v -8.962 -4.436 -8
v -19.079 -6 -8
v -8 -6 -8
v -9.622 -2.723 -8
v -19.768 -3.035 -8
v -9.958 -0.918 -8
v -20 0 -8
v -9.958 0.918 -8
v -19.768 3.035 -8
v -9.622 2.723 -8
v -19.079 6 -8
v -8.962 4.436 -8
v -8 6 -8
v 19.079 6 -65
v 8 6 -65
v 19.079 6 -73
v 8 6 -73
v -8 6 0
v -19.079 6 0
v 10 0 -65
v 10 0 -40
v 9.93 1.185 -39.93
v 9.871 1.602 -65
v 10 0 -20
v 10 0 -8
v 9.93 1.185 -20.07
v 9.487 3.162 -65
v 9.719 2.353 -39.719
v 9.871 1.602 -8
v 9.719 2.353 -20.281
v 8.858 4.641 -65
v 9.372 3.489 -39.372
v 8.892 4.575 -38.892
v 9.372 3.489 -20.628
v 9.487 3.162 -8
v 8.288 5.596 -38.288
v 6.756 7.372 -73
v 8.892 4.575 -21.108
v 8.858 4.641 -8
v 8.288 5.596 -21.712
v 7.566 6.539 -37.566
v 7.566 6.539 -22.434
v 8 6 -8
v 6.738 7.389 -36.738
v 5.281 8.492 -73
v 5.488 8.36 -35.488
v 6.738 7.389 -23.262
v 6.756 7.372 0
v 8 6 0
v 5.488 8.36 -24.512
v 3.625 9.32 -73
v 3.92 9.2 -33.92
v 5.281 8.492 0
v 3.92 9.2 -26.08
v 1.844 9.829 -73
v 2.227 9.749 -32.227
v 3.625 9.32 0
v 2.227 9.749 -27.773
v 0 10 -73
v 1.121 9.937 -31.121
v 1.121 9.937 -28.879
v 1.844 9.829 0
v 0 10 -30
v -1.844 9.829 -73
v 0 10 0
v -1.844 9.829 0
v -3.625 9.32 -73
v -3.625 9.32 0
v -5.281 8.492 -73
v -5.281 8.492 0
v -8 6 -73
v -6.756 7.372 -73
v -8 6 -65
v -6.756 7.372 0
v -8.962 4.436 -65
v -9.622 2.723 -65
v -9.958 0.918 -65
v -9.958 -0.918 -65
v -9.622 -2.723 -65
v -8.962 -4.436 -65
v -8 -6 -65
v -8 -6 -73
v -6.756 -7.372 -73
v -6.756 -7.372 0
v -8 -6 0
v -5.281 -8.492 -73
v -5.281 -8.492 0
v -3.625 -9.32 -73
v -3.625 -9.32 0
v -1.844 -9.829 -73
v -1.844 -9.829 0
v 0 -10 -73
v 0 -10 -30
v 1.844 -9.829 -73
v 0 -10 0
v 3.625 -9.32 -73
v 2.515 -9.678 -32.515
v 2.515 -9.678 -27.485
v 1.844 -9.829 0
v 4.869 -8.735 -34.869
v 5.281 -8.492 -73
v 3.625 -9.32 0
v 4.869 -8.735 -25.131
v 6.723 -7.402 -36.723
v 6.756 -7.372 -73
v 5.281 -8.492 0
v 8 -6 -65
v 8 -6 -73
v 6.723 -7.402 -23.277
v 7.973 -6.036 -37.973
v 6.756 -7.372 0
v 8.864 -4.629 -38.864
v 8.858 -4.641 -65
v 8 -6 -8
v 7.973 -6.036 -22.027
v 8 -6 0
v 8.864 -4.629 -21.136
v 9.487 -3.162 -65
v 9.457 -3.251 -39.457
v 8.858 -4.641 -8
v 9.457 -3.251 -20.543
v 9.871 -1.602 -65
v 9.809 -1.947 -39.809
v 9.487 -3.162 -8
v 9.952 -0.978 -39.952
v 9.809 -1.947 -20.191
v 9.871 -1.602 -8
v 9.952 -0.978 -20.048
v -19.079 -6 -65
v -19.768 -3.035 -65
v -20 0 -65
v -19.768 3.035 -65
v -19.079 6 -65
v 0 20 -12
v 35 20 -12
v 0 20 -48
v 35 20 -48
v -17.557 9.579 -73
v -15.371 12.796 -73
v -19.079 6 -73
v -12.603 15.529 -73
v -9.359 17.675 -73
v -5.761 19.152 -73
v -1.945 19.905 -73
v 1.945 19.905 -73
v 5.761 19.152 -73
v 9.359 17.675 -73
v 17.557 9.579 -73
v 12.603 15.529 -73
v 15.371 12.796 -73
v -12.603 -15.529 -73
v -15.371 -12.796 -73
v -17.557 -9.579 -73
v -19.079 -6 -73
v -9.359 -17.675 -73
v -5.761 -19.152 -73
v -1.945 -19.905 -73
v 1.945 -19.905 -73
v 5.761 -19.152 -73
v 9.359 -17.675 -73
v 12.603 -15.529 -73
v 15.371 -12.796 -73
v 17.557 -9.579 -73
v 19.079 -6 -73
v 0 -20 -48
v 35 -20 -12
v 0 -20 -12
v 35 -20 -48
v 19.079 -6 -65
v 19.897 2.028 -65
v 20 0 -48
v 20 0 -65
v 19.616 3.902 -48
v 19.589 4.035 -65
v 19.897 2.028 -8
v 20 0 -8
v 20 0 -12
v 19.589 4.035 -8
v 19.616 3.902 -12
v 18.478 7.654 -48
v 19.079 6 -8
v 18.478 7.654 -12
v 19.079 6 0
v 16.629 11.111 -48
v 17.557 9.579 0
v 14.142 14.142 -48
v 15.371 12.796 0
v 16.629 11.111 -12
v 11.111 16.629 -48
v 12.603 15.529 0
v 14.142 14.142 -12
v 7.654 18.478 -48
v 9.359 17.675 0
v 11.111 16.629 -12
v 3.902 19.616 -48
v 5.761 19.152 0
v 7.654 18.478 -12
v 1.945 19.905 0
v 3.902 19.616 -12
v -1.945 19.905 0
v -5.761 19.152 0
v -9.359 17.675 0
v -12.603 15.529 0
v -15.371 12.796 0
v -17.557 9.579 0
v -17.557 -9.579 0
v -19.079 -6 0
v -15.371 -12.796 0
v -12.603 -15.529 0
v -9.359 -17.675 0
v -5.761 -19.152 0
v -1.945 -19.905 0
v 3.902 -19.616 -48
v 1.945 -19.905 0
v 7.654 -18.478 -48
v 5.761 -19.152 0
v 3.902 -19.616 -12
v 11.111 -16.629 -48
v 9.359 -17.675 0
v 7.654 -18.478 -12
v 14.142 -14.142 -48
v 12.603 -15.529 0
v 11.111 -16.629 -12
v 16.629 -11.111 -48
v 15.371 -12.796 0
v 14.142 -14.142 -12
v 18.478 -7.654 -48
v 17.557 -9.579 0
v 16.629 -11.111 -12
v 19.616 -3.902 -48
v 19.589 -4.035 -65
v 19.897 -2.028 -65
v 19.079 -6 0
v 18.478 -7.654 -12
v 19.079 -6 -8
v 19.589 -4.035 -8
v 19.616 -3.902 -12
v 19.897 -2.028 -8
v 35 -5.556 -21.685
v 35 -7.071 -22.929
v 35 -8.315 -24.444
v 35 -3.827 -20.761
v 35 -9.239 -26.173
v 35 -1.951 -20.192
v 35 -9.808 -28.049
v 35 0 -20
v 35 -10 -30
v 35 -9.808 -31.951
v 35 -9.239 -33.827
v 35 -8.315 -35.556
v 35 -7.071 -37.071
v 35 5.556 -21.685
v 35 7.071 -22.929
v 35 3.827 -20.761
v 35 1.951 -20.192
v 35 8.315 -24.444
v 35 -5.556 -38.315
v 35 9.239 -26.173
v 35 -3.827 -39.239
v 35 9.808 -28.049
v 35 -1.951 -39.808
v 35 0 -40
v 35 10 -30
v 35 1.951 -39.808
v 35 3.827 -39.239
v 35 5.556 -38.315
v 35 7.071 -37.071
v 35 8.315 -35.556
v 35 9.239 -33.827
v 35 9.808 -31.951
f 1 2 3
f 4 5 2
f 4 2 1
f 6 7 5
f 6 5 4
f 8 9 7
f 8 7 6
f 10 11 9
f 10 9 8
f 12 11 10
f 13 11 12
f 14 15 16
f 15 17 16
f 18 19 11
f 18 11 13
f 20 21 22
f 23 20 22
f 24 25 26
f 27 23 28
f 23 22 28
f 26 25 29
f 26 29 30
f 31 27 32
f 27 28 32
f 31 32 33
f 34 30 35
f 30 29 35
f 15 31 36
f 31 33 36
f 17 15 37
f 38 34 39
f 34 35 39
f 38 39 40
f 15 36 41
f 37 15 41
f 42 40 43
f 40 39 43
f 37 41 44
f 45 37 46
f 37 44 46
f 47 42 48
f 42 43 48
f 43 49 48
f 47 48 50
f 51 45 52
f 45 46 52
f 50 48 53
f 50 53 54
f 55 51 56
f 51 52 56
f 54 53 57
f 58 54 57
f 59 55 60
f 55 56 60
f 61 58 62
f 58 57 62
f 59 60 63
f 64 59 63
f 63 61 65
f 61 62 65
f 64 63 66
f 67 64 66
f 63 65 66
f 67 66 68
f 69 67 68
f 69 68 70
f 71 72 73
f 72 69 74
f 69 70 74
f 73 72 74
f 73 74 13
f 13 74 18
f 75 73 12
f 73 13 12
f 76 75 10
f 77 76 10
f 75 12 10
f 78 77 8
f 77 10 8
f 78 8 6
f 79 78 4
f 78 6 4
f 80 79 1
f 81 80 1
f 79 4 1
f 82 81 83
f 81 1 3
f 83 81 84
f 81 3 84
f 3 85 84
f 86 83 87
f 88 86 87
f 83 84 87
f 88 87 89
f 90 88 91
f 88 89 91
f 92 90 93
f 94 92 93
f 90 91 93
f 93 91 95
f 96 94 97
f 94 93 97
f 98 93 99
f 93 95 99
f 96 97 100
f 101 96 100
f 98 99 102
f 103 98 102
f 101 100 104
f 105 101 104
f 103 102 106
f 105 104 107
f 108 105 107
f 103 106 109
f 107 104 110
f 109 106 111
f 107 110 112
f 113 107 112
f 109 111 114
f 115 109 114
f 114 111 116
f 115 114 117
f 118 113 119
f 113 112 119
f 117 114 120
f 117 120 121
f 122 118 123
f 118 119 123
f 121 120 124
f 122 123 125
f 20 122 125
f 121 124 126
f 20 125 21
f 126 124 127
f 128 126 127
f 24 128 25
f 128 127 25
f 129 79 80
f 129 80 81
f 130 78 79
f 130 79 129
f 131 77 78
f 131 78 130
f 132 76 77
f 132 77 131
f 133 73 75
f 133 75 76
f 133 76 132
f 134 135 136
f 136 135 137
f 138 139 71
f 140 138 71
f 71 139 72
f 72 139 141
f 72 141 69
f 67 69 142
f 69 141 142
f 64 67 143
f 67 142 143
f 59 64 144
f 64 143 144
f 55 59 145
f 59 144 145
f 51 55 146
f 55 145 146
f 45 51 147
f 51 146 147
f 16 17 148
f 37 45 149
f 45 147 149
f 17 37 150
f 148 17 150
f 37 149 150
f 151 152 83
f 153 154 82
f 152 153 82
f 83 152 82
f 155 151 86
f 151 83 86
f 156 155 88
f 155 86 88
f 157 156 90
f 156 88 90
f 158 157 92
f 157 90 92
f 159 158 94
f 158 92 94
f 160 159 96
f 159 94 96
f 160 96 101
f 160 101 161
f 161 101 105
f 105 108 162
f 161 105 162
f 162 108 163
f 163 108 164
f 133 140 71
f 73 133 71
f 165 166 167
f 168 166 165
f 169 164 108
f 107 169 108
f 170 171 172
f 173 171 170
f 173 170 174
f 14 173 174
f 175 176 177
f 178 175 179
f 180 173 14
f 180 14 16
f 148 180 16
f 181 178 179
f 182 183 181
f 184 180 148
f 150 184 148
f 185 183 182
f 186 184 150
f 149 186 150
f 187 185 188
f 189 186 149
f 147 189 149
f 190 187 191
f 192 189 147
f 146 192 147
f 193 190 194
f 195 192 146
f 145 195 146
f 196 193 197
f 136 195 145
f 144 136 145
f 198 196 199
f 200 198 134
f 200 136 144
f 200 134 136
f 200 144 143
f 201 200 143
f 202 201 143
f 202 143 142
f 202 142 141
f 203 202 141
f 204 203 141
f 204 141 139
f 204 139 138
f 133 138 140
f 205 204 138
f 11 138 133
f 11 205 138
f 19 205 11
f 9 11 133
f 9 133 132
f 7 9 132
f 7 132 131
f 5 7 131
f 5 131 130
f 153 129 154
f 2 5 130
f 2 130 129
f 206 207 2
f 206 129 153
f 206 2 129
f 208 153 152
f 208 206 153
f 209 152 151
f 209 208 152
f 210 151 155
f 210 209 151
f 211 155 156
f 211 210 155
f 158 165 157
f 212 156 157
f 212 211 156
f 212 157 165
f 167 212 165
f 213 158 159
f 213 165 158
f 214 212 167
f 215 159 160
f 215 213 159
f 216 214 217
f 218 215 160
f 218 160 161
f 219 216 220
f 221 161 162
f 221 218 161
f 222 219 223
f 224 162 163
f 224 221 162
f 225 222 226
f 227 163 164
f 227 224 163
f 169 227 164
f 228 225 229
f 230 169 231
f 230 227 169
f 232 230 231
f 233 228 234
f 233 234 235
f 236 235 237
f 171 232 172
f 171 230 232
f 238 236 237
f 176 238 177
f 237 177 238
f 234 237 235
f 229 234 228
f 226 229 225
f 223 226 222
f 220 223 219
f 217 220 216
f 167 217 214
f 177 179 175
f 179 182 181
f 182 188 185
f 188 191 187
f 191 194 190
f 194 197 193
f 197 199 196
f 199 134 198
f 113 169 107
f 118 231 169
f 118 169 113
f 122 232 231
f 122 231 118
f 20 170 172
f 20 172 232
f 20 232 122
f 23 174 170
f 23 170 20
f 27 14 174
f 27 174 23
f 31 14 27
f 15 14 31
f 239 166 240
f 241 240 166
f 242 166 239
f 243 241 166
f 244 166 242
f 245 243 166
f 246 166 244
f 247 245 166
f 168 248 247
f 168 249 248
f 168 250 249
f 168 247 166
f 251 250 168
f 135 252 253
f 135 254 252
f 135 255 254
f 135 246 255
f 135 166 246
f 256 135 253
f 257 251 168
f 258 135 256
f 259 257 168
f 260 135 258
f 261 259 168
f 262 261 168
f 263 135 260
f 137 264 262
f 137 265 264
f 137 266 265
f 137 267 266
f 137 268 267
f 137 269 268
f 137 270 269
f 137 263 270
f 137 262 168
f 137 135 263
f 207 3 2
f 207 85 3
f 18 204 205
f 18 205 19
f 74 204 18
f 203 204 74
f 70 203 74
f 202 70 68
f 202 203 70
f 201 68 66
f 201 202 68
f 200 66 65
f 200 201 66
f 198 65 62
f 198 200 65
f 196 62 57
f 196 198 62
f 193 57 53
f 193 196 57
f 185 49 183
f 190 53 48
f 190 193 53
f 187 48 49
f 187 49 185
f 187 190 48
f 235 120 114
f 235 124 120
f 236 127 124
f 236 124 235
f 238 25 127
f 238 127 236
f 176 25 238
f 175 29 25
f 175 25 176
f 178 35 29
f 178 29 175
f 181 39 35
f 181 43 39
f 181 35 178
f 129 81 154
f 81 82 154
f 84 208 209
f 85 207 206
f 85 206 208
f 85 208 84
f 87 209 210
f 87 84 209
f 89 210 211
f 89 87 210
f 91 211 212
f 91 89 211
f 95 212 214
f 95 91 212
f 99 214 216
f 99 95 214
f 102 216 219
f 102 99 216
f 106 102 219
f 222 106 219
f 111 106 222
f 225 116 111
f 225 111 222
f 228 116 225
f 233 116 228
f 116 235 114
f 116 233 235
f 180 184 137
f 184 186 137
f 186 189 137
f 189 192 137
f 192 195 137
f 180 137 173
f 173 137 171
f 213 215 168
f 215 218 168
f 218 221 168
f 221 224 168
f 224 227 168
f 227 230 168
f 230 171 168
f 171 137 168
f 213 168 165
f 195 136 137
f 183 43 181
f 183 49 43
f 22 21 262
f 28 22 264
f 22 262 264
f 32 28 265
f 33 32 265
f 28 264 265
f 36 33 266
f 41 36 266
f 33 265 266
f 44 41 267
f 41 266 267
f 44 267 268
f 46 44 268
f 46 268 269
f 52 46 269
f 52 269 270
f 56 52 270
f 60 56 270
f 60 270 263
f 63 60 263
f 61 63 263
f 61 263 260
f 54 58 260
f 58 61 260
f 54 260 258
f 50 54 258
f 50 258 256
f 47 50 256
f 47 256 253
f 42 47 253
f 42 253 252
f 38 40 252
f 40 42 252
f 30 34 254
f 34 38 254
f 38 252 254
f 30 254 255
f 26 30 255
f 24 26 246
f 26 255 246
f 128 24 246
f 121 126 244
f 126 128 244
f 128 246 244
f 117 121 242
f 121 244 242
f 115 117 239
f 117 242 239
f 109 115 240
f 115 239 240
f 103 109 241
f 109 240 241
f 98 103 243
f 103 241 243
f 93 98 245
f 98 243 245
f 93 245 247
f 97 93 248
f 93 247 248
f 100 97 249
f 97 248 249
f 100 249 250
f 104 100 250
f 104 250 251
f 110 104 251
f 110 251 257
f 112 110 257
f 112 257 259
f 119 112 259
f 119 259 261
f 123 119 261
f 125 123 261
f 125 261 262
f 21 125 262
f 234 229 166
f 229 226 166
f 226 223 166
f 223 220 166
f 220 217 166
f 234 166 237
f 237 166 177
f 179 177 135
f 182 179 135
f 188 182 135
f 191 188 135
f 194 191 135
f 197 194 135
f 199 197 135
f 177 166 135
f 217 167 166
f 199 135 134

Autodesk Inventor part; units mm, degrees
ref_plane "YZ Plane" through (0, 0, 0) normal (1, 0, 0) x (0, 1, 0)
sketch "Szkic1" plane through (0, 0, 0) normal (0, 0, 1) x (1, 0, 0)
  circle A0 centre (0, 0) radius 20
  circle A1 centre (0, 0) radius 10
  dimension "d0" = 40
  dimension "d1" = 20
extrude "Wyciągnięcie proste1" add sketch "Szkic1" against normal blind 73
sketch "Szkic2" plane through (0, 0, 0) normal (0, 0, 1) x (1, 0, 0)
  line L0 (0, 0) -> (0, 6)
  line L1 (0, 6) -> (24.4781, 6)
  line L2 (24.4781, 6) -> (24.4781, -6)
  line L3 (24.4781, -6) -> (-24.6977, -6)
  line L4 (-24.6977, -6) -> (-24.6977, 6)
  line L5 (-24.6977, 6) -> (0, 6)
  dimension "d4" = 6
  dimension "d5" = 12
extrude "Wyciągnięcie proste2" cut sketch "Szkic2" against normal blind 8
sketch "Szkic3" plane through (0, 0, -73) normal (0, 0, -1) x (-1, 0, 0)
  line L0 (0, 0) -> (23.7964, 0)
  line L1 (0, 0) -> (26.8721, 0)
  line L2 (26.8721, 0) -> (26.8721, 6)
  line L3 (26.8721, 6) -> (-29.6241, 6)
  line L4 (-29.6241, 6) -> (-29.6241, -6)
  line L5 (-29.6241, -6) -> (26.8721, -6)
  line L6 (26.8721, -6) -> (26.8721, 0)
  dimension "d8" = 6
  dimension "d9" = 12
extrude "Wyciągnięcie proste3" cut sketch "Szkic3" against normal blind 8
ref_plane "Płaszczyzna konstrukcyjna1" through (35, -6, 0) normal (1, 0, 0) x (0, 0, -1)
sketch "Szkic5" plane through (35, -6, 0) normal (1, 0, 0) x (0, 0, -1)
  point P0 (0, 6)
ref_plane "Płaszczyzna konstrukcyjna2" through (35, -6, 0) normal (1, 0, 0) x (0, 0, -1)
sketch "Szkic6" plane through (35, -6, 0) normal (1, 0, 0) x (0, 0, -1)
  line L0 (12, 0) -> (12, 2) projected
  line L1 (12, 2) -> (12, 26)
  line L2 (0, 26) -> (73, 26) projected
  line L3 (12, 26) -> (48, 26)
  line L4 (48, 26) -> (48, -14)
  line L5 (0, -14) -> (73, -14) projected
  line L6 (12, -14) -> (12, 2)
  line L7 (12, 0) -> (0, 0) projected
  point P0 (0, 6)
  dimension "d16" = 36
extrude "Wyciągnięcie proste5" add sketch "Szkic6" against normal blind 35
sketch "Szkic7" plane through (0, 0, -12) normal (0, 0, 1) x (1, 0, 0)
  circle A0 centre (0, 0) radius 10
  dimension "d19" = 20
extrude "Wyciągnięcie proste6" cut sketch "Szkic7" against normal blind 65
sketch "Szkic8" plane through (35, -6, 0) normal (1, 0, 0) x (0, 0, -1)
  line L0 (12, 26) -> (12, -14) projected
  circle A0 centre (30, 6) radius 10
  point P0 (0, 6)
  dimension "d24" = 20
extrude "Wyciągnięcie proste7" cut sketch "Szkic8" against normal blind 35
